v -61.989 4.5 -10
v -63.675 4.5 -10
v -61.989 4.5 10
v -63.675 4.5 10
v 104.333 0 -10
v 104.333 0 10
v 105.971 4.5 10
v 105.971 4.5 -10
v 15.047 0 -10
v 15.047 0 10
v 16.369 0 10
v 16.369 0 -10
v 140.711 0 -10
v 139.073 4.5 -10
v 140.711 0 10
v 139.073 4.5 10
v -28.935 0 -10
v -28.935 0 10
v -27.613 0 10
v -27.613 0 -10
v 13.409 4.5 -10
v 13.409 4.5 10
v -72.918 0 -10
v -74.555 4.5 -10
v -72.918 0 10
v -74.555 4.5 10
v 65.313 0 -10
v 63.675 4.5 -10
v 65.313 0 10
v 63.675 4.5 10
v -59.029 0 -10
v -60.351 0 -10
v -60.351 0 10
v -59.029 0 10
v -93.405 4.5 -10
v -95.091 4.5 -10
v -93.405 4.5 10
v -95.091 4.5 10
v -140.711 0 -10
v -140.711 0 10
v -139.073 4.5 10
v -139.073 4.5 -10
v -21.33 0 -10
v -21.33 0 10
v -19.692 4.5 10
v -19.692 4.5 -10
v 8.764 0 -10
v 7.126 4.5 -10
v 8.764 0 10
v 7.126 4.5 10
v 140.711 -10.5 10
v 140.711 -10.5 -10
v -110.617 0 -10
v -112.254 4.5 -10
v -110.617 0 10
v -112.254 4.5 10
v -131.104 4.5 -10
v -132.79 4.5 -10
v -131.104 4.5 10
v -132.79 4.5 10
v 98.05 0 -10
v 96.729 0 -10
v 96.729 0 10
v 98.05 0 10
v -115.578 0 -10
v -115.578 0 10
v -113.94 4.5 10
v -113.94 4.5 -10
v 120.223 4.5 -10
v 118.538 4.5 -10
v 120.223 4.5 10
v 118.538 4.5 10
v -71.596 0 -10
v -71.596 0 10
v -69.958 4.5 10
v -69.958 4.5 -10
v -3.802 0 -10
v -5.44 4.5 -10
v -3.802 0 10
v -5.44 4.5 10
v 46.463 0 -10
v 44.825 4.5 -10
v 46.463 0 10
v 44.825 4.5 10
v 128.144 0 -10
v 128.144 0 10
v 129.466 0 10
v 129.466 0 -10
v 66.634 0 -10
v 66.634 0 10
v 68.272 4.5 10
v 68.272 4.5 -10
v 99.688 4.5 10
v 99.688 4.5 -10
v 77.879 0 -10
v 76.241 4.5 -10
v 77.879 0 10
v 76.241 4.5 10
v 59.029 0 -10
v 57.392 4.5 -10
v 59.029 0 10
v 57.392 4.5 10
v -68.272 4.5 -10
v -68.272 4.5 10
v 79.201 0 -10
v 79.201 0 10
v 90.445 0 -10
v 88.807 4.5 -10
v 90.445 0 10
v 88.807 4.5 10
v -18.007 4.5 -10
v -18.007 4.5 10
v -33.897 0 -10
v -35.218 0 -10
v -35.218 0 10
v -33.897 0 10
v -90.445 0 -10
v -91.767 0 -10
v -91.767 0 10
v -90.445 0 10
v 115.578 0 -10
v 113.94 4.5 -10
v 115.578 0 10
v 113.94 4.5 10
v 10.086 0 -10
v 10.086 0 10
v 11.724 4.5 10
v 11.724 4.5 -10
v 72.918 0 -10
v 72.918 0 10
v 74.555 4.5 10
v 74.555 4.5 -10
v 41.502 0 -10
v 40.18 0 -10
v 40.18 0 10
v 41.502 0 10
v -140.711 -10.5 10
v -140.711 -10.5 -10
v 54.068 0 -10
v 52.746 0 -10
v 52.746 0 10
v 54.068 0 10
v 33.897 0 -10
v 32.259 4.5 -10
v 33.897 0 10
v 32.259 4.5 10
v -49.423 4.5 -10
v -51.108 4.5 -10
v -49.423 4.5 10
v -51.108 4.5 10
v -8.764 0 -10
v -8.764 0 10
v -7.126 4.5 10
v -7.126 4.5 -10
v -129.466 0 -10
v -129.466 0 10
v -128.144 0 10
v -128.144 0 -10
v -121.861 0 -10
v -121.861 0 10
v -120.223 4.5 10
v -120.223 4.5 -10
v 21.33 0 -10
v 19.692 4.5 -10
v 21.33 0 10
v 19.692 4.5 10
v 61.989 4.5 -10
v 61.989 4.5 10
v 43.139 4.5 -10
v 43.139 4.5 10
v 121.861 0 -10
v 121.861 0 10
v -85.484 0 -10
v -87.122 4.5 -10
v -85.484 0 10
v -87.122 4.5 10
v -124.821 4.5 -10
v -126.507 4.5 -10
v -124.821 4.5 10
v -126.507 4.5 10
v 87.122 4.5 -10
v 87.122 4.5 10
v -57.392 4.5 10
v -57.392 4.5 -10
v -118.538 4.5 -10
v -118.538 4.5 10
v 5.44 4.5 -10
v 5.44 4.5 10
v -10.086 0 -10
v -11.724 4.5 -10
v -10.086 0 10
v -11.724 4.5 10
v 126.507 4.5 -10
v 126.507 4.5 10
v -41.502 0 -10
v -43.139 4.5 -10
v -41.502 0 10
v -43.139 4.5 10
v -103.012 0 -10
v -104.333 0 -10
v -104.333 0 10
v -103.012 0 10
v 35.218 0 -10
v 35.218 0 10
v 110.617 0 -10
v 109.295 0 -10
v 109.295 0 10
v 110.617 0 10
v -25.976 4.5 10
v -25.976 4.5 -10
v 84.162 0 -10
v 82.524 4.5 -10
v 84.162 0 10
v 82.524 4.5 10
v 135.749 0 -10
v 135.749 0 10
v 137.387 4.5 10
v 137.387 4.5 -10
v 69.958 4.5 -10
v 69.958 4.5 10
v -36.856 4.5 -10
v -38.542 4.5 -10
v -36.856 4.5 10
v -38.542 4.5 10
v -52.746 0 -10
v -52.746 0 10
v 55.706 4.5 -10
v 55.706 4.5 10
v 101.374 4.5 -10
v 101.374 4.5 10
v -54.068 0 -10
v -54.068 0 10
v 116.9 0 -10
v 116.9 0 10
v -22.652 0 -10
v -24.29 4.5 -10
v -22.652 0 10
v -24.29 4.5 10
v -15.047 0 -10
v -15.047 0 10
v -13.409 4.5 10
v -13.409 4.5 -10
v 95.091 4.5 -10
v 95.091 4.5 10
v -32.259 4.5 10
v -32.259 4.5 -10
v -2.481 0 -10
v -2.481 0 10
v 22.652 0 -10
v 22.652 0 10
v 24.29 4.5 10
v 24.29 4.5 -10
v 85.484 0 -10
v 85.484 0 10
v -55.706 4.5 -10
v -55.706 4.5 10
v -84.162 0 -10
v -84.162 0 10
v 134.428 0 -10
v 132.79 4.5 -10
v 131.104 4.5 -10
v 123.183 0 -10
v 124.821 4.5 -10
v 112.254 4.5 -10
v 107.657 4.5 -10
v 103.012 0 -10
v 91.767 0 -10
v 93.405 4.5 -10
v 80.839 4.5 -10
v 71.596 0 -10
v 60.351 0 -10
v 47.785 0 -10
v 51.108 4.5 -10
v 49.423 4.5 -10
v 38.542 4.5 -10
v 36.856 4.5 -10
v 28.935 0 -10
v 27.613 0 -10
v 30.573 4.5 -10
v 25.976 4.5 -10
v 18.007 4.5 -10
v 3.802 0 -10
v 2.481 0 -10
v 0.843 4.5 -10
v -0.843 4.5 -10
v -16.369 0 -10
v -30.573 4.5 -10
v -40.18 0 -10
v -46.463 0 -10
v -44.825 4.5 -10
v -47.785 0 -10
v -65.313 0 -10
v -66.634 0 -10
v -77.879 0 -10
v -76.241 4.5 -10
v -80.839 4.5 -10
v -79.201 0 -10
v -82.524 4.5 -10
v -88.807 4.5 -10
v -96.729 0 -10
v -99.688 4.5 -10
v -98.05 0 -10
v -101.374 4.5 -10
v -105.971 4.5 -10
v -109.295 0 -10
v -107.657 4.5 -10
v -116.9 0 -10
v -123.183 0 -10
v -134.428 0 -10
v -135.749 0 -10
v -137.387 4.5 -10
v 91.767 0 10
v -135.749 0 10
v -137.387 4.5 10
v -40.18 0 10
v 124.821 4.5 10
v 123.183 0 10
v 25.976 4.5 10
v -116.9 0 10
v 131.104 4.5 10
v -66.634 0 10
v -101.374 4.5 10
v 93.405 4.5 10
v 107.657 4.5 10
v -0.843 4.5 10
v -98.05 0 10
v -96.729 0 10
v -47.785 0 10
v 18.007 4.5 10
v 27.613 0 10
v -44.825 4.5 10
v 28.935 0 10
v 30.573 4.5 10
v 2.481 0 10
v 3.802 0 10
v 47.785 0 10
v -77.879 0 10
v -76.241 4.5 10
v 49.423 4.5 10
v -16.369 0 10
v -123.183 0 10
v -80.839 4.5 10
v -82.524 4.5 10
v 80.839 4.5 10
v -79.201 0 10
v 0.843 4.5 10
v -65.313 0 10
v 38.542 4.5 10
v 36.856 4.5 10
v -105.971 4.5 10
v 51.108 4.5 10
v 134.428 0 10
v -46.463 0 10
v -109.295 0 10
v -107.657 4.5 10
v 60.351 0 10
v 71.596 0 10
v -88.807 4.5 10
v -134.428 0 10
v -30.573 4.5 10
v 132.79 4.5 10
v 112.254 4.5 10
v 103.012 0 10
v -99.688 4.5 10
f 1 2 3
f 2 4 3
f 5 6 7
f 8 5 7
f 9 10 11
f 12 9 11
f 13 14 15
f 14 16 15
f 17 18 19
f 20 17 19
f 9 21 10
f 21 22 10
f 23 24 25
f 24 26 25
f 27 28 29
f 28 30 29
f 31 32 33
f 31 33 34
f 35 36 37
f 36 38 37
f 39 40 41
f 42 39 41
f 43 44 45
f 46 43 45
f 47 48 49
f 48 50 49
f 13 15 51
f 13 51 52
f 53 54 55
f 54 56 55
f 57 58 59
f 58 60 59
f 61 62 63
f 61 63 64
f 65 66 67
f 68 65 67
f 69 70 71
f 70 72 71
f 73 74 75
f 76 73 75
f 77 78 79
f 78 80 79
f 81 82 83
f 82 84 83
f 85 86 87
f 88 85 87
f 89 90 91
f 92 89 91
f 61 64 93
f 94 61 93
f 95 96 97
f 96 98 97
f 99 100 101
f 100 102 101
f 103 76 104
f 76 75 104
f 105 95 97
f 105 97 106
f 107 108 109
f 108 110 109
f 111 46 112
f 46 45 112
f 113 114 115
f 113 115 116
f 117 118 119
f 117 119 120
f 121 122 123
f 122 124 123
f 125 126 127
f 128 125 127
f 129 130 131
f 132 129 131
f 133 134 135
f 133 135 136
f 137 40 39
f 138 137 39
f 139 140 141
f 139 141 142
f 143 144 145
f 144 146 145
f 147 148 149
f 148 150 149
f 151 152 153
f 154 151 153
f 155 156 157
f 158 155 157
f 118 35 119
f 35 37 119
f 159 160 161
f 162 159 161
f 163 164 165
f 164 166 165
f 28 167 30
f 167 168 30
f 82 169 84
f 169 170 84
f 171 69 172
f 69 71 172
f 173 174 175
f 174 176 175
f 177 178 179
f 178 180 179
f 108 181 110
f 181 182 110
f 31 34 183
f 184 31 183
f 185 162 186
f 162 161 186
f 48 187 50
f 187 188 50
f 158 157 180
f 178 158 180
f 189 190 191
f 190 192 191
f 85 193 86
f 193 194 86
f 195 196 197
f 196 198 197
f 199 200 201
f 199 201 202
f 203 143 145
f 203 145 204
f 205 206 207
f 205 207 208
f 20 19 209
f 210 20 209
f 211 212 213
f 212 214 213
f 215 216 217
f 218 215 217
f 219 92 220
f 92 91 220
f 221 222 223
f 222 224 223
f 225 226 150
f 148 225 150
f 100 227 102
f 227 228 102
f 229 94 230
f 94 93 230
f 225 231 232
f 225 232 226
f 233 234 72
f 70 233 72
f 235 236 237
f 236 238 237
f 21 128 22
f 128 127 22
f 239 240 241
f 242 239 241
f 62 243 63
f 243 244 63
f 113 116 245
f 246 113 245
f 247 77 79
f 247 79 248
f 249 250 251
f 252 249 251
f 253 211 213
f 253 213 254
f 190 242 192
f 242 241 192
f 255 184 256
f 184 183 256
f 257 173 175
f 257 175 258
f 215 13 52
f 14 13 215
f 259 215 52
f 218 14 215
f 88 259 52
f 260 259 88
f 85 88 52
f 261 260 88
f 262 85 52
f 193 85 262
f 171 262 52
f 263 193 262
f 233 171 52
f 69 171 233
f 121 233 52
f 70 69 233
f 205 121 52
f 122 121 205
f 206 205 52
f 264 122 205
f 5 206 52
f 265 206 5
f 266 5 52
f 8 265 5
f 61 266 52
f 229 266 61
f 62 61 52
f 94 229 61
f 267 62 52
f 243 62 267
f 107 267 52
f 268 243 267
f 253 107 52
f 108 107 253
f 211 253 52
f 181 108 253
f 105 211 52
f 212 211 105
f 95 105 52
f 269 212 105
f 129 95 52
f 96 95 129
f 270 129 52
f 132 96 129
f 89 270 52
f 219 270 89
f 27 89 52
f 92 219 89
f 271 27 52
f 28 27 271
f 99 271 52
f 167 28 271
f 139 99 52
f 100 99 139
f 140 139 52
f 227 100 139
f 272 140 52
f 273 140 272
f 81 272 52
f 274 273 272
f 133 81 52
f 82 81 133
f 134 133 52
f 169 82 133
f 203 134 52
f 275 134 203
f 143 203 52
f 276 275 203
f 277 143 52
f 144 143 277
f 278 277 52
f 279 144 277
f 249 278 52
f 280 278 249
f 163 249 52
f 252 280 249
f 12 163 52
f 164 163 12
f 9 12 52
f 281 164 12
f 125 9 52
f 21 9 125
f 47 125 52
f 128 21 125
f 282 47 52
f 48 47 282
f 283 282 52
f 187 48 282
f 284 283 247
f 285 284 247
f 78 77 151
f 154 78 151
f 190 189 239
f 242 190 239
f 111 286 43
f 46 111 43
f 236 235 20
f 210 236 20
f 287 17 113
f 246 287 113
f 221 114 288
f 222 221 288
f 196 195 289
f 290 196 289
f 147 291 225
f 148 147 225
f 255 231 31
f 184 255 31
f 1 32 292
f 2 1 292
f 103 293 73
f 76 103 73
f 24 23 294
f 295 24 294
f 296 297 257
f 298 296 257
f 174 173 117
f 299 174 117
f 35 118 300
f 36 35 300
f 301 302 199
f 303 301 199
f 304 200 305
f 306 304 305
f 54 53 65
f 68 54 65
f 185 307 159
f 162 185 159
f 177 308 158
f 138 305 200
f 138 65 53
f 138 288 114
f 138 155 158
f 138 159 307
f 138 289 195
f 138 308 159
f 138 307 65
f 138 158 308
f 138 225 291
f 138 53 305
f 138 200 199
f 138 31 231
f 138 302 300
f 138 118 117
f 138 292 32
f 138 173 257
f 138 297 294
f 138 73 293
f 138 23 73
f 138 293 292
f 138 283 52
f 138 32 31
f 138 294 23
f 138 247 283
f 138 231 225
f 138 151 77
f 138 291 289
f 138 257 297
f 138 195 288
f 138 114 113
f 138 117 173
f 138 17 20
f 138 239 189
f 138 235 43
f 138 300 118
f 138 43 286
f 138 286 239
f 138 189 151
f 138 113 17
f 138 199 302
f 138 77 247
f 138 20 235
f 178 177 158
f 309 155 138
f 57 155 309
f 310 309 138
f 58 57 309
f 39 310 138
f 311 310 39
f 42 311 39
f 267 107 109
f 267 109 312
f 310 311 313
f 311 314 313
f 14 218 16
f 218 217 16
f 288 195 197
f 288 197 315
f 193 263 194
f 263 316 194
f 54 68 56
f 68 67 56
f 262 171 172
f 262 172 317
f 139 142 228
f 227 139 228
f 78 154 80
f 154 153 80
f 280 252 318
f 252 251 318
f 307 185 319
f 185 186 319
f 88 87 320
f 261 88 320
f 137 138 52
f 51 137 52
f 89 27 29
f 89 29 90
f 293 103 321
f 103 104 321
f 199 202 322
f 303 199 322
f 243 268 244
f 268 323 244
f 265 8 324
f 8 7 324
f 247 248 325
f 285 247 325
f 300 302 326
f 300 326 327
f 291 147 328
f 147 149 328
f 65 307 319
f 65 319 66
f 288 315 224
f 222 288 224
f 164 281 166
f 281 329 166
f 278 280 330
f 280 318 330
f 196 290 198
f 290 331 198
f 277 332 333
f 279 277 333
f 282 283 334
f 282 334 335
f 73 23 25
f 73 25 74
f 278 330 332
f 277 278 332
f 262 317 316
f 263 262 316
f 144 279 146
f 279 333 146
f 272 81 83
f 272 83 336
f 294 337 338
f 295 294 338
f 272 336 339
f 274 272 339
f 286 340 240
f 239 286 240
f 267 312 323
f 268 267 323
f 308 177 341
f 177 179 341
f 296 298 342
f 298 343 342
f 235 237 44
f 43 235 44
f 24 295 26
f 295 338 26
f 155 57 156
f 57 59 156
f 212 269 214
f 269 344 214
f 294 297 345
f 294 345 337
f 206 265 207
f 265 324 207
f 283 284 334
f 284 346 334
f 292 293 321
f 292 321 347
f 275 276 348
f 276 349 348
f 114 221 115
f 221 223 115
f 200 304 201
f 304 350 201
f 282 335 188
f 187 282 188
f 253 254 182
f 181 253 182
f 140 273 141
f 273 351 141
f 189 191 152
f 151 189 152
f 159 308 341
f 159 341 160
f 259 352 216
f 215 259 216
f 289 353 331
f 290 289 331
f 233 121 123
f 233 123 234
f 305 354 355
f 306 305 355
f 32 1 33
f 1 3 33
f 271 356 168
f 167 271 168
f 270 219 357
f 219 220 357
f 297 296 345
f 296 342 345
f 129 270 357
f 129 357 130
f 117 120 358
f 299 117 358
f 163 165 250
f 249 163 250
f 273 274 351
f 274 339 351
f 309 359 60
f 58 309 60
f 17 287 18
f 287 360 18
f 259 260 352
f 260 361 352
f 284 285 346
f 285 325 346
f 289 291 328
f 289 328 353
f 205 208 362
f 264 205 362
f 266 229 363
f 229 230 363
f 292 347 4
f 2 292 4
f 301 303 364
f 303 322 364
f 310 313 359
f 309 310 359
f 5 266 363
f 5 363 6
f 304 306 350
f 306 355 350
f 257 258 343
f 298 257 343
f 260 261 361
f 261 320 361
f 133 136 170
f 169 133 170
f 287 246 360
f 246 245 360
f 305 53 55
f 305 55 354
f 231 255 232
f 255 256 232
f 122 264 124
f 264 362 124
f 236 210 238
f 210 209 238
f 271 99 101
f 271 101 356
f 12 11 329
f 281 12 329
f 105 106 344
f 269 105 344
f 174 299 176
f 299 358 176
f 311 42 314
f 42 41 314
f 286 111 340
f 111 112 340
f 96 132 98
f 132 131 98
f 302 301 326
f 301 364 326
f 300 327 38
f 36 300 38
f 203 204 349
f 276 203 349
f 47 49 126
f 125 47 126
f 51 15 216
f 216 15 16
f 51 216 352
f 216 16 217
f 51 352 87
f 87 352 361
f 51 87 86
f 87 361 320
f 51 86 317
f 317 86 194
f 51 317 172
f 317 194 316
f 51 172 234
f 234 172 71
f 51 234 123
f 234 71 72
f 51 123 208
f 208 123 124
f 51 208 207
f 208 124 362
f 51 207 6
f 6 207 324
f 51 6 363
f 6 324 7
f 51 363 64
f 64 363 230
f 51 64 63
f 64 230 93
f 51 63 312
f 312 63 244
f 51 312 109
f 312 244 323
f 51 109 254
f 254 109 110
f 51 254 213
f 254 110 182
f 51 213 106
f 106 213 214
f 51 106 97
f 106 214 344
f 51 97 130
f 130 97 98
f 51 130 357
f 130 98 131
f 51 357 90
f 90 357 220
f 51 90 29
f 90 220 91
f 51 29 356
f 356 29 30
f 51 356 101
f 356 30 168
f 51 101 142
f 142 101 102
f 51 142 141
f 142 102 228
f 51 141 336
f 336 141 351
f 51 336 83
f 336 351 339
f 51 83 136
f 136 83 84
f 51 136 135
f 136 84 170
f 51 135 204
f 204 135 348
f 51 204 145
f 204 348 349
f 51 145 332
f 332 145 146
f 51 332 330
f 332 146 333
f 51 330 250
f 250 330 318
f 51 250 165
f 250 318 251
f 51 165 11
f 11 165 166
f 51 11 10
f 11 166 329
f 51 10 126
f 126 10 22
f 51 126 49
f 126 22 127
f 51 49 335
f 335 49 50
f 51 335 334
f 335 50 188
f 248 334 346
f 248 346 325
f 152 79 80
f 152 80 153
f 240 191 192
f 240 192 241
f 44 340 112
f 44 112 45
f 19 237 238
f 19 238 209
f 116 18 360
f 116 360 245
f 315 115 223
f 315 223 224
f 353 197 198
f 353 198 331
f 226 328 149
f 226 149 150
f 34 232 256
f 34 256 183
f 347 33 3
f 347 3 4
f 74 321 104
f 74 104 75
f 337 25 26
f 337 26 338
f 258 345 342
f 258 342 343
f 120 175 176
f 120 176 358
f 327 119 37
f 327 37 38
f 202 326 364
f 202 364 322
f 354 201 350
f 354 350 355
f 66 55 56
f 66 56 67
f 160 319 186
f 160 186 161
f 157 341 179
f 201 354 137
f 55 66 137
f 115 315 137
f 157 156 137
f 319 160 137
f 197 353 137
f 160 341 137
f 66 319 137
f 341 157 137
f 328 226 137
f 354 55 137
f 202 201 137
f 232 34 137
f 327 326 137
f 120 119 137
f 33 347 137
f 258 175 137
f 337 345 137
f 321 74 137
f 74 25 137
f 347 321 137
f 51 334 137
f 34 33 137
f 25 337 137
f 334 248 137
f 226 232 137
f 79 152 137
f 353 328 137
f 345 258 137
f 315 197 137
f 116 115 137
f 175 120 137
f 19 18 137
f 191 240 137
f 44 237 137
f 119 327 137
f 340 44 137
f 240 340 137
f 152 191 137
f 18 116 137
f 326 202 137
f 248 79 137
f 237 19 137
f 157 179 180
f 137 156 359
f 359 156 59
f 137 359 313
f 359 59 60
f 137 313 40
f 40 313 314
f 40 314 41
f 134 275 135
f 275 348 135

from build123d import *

# Parameters (mm, degrees)
SKETCH_2_W             = 281.42159734
SKETCH_2_H             = 20
EXTRUDE_1_DEPTH        = 10.5
EXTRUDE_2_DEPTH        = 10
PATTERN_LINEAR_1_COUNT = 45
PATTERN_LINEAR_1_PITCH = 6.283185307


with BuildPart() as part:
    # 草图2 → 凸台-拉伸1 (new body)
    with BuildSketch(Plane(origin=(0, 0, 0), x_dir=(1, 0, 0), z_dir=(0, 1, 0))):
        Rectangle(SKETCH_2_W, SKETCH_2_H)
    extrude(amount=-EXTRUDE_1_DEPTH)

    # 草图3 → 凸台-拉伸2 (add, symmetric)
    with BuildSketch(Plane.XY):
        Polygon((-140.71079867, 0), (-139.072932616, 4.5), (-137.3872209, 4.5), (-135.749354845, 0), align=None)
    extrude_2 = extrude(amount=EXTRUDE_2_DEPTH, both=True)

    # 阵列(线性)1: 凸台-拉伸2 ×45
    with Locations(*[(i * PATTERN_LINEAR_1_PITCH, 0, 0) for i in range(1, PATTERN_LINEAR_1_COUNT)]):
        add(extrude_2)


solid = part.part
